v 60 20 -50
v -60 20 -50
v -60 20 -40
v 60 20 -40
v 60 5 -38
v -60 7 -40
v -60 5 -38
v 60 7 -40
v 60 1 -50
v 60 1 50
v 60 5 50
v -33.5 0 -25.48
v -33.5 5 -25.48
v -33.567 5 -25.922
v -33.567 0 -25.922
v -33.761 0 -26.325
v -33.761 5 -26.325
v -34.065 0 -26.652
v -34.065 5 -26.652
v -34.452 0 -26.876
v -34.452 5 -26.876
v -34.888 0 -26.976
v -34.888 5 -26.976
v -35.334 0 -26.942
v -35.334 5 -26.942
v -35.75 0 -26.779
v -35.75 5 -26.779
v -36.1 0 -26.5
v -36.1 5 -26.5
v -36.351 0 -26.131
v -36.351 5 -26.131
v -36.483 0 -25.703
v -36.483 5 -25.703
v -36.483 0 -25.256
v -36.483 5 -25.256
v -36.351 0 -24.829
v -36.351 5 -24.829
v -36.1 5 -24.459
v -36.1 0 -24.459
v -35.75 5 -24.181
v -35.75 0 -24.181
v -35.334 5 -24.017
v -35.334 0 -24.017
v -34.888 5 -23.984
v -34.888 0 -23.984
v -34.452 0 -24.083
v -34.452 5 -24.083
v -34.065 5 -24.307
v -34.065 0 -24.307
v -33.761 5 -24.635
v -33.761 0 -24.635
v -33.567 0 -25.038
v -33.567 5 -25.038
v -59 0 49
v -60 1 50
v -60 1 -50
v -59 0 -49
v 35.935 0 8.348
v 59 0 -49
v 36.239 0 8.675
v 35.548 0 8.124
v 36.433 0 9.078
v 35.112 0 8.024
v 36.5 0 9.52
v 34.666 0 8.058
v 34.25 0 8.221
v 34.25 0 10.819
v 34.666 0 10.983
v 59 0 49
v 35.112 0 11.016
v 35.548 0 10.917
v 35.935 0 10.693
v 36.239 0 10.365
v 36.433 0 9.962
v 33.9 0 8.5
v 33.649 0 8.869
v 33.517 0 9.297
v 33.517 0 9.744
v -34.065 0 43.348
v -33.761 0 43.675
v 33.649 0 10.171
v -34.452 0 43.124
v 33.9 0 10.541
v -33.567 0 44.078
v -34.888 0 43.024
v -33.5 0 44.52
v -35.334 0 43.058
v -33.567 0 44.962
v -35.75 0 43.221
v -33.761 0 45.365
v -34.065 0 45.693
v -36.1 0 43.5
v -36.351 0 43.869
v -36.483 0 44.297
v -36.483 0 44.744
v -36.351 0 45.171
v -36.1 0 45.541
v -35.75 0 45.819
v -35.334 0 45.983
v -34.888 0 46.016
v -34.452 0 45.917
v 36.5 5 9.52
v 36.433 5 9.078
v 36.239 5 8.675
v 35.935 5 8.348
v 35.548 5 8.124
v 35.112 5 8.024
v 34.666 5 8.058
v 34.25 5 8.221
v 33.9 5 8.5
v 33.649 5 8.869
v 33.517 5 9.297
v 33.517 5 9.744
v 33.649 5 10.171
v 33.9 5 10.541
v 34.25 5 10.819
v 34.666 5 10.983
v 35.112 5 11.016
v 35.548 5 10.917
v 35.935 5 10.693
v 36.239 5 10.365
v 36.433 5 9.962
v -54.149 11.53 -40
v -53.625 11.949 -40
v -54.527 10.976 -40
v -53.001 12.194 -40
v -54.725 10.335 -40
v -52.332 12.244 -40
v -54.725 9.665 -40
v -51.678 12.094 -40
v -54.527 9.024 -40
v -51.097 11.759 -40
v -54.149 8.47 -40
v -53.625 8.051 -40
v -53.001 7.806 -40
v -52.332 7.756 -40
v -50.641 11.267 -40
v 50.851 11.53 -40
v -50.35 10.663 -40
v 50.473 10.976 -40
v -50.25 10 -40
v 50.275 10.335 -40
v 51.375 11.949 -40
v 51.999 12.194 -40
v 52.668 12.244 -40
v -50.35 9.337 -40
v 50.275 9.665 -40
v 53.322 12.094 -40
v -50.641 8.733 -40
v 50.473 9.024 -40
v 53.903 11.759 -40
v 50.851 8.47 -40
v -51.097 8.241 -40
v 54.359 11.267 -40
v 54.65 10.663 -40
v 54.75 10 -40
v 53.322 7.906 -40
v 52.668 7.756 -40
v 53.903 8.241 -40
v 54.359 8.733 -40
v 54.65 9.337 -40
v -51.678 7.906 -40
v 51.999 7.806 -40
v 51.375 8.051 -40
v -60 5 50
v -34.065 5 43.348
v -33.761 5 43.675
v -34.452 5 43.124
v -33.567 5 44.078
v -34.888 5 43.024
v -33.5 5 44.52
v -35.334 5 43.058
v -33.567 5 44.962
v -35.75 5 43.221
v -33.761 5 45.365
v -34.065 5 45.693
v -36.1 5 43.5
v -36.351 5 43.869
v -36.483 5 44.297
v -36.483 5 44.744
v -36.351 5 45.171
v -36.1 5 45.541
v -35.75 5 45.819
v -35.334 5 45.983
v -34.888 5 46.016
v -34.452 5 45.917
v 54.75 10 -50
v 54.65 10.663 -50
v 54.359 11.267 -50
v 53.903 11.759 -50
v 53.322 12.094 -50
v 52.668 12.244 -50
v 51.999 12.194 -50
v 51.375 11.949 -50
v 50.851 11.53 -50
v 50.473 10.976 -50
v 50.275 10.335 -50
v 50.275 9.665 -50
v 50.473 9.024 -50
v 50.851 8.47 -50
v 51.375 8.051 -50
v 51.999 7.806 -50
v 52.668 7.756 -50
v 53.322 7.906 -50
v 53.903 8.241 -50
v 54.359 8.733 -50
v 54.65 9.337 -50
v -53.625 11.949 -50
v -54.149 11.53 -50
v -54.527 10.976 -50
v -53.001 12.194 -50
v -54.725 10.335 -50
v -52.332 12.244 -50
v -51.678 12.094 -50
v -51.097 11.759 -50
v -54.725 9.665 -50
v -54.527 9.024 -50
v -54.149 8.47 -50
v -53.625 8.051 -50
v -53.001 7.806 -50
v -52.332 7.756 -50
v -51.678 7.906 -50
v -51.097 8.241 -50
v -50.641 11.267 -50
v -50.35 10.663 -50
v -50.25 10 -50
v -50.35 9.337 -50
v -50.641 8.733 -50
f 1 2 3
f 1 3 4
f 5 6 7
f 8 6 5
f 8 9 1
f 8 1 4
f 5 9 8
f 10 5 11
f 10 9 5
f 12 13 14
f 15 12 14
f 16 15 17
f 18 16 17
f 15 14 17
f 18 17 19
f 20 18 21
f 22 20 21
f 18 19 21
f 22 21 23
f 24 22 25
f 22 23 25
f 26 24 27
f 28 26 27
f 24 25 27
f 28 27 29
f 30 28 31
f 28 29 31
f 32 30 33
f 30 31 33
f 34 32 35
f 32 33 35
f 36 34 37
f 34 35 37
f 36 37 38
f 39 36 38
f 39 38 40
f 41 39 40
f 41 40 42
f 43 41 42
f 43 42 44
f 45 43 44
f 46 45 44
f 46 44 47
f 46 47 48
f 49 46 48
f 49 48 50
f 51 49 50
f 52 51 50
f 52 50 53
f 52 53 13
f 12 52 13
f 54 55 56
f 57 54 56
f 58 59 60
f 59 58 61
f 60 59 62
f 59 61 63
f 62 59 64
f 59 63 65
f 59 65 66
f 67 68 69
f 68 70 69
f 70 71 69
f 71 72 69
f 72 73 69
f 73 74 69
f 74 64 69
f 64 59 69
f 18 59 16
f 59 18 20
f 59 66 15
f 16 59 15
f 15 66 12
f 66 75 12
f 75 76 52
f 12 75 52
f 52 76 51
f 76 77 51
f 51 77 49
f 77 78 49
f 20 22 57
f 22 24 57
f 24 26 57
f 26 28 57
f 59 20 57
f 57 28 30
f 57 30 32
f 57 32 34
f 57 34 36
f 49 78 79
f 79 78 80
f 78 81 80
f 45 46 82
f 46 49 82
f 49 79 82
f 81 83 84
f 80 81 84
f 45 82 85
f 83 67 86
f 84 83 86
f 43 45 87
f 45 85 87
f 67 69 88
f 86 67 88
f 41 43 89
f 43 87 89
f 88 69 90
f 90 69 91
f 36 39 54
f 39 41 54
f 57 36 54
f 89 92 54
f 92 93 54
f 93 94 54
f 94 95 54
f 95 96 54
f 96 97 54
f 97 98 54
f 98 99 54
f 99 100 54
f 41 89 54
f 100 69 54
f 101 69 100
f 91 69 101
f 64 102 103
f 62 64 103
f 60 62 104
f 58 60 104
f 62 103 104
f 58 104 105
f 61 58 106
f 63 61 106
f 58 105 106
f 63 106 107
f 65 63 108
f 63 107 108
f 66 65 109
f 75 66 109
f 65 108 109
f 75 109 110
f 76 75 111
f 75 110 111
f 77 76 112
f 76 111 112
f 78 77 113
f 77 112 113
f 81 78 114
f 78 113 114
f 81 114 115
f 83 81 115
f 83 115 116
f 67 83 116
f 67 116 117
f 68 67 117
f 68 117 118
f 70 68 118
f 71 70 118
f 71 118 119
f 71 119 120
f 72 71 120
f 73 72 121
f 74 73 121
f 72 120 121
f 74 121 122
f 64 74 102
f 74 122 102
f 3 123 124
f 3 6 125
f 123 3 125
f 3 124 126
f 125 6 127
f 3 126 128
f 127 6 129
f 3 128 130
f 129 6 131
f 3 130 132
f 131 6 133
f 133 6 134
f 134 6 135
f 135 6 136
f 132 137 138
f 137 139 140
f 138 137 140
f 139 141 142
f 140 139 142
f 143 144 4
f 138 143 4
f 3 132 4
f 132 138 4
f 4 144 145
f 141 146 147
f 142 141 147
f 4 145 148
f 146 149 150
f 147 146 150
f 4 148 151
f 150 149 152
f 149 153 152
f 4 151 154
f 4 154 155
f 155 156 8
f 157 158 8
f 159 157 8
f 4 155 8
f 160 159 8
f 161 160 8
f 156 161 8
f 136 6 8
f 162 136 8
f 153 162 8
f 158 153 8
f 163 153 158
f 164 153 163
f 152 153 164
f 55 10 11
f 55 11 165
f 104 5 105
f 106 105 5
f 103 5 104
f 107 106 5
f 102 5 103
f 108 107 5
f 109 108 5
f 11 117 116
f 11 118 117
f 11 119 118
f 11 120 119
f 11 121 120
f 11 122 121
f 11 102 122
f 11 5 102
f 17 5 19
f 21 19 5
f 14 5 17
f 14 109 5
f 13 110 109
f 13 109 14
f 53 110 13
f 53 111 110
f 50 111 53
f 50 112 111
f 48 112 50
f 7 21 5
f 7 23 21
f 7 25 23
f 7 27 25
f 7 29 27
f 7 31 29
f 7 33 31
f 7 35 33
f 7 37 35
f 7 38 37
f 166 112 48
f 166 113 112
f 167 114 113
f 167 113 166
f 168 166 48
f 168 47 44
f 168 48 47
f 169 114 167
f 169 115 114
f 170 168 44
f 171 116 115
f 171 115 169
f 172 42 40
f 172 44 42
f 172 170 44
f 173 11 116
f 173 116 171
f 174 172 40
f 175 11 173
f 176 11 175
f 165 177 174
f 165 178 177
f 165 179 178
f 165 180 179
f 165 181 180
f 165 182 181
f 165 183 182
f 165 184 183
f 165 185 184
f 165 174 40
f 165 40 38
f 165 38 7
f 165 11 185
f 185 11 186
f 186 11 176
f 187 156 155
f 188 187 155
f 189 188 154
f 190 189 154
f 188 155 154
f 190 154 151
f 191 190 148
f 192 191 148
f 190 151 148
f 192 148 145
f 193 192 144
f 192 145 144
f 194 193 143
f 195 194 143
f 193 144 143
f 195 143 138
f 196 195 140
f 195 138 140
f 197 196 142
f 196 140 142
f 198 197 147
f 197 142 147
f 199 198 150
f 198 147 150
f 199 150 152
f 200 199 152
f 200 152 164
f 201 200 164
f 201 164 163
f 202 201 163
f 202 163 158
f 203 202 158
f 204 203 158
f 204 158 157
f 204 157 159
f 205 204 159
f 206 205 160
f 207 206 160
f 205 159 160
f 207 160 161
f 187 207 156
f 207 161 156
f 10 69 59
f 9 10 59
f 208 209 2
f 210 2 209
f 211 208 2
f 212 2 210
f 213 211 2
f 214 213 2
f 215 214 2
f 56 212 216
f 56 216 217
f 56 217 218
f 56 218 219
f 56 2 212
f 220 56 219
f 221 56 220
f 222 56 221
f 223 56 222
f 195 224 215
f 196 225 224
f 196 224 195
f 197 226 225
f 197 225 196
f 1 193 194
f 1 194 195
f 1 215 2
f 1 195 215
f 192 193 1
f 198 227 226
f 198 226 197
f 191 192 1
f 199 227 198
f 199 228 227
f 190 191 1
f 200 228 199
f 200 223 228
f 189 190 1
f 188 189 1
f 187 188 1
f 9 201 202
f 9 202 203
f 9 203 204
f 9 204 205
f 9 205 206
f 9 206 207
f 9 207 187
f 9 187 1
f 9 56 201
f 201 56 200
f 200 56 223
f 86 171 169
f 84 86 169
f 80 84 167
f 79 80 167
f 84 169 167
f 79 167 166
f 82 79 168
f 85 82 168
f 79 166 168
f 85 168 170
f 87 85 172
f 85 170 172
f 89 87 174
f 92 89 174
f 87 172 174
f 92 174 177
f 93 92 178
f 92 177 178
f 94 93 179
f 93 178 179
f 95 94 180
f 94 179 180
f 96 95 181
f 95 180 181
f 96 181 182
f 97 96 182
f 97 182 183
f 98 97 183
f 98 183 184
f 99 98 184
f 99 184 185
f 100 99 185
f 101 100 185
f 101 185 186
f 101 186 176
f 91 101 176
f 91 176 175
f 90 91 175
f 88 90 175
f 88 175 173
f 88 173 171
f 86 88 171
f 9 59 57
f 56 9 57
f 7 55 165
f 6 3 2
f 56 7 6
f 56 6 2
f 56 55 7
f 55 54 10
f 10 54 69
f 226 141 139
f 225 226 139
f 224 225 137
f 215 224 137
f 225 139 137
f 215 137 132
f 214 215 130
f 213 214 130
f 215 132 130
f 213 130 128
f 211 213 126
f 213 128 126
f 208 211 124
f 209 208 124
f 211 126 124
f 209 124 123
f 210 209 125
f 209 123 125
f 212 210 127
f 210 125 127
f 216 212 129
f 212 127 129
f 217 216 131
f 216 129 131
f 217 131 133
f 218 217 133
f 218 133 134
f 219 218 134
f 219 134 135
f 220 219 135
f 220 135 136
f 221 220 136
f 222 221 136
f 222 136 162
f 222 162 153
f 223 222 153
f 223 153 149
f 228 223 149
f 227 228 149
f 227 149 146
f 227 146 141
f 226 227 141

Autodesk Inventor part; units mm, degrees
ref_plane "YZ Plane" through (0, 0, 0) normal (1, 0, 0) x (0, 1, 0)
ref_plane "XZ Plane" through (0, 0, 0) normal (0, 1, 0) x (-1, 0, 0)
ref_plane "XY Plane" through (0, 0, 0) normal (0, 0, 1) x (1, 0, 0)
sketch "Sketch1" plane through (0, 0, 0) normal (0, 1, 0) x (-1, 0, 0)
  line L0 (-60, 50) -> (60, 50)
  line L1 (60, 50) -> (60, -50)
  line L2 (60, -50) -> (-60, -50)
  line L3 (-60, -50) -> (-60, 50)
  line L4 (-60, 50) -> (60, -50) construction
  line L5 (60, 50) -> (-60, -50) construction
  point P0 (0, 0)
  dimension "d0" = 100
  dimension "d1" = 120
extrude "Extrusion1" add sketch "Sketch1" along normal blind 5
sketch "Sketch2" plane through (0, 5, 0) normal (0, 1, 0) x (1, 0, 0)
  line L0 (-70.5402, 20) -> (79.21, 20) construction
  line L1 (-60, -50) -> (60, -50) projected
  line L2 (60, 50) -> (-60, 50)
  line L3 (-60, 50) -> (-60, 40)
  line L4 (-60, 40) -> (60, 40)
  line L5 (60, 40) -> (60, 50)
  line L6 (60, 50) -> (-60, 40) construction
  line L7 (-60, 50) -> (60, 40) construction
  line L8 (0, 70) -> (0, -70) projected
  line L9 (-60, 50) -> (-60, -50) projected
  line L10 (60, 50) -> (-60, 50) projected
  point P0 (0, 0)
  point P1 (0, 45)
  point P2 (0, 45)
  dimension "d4" = 70
  dimension "d5" = 10
extrude "Extrusion2" add sketch "Sketch2" along normal blind 15 contours L3 L2 L8 L4 | L8 L2 L5 L4
sketch "Sketch3" plane through (-60, 5, -40) normal (0, 0, 1) x (1, 0, 0)
  circle A0 centre (7.5, 5) radius 2.25
  line L0 (60, -9) -> (60, 19) construction
  circle A1 centre (112.5, 5) radius 2.25
  line L1 (120, 0) -> (0, 0) projected
  line L2 (0, -5) -> (120, -5) projected
  point P0 (60, -5)
  dimension "d8" = 4.5
  dimension "d9" = 105
  dimension "d22" = 10
extrude "Extrusion3" cut sketch "Sketch3" against normal up to next
sketch "Sketch4" plane through (0, 5, 0) normal (0, 1, 0) x (1, 0, 0)
  circle A0 centre (-35, 25.4797) radius 1.5
  circle A1 centre (-35, -44.5203) radius 1.5
  circle A2 centre (35, -9.5203) radius 1.5
  line L0 (-101.4889, -9.5203) -> (42.7418, -9.5203) construction
  point P0 (0, 0)
  dimension "d13" = 70
  dimension "d14" = 70
  dimension "d15" = 3
  dimension "d16" = 35
extrude "Extrusion4" cut sketch "Sketch4" against normal up to next
chamfer "Chamfer2" distance 2 angle 45 1 edges at (0, 5, -40)
chamfer "Chamfer3" distance 1 angle 45 4 edges at (-60, 0, 0) (0, 0, 50) (0, 0, -50) (60, 0, 0)
equation "\"d16\" = 0.5 * d14"
properties part number "_3DPrint"
